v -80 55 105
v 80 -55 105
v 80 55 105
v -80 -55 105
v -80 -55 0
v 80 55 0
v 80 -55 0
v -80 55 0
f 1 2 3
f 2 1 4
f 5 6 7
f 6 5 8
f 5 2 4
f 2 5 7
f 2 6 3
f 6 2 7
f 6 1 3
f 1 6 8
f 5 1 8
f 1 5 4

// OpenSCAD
// Generated documentary F1 envelope proxy.
// Not manufacturing geometry, not dimensionally validated, not SimReady.
proxy_id = "993-TURBO-HEAT-SHIELD-COVER-LEFT";
$fn = 96;

length_mm = 160;
width_mm = 110;
height_mm = 105;

translate([-length_mm / 2, -width_mm / 2, 0])
    cube([length_mm, width_mm, height_mm], center = false);
